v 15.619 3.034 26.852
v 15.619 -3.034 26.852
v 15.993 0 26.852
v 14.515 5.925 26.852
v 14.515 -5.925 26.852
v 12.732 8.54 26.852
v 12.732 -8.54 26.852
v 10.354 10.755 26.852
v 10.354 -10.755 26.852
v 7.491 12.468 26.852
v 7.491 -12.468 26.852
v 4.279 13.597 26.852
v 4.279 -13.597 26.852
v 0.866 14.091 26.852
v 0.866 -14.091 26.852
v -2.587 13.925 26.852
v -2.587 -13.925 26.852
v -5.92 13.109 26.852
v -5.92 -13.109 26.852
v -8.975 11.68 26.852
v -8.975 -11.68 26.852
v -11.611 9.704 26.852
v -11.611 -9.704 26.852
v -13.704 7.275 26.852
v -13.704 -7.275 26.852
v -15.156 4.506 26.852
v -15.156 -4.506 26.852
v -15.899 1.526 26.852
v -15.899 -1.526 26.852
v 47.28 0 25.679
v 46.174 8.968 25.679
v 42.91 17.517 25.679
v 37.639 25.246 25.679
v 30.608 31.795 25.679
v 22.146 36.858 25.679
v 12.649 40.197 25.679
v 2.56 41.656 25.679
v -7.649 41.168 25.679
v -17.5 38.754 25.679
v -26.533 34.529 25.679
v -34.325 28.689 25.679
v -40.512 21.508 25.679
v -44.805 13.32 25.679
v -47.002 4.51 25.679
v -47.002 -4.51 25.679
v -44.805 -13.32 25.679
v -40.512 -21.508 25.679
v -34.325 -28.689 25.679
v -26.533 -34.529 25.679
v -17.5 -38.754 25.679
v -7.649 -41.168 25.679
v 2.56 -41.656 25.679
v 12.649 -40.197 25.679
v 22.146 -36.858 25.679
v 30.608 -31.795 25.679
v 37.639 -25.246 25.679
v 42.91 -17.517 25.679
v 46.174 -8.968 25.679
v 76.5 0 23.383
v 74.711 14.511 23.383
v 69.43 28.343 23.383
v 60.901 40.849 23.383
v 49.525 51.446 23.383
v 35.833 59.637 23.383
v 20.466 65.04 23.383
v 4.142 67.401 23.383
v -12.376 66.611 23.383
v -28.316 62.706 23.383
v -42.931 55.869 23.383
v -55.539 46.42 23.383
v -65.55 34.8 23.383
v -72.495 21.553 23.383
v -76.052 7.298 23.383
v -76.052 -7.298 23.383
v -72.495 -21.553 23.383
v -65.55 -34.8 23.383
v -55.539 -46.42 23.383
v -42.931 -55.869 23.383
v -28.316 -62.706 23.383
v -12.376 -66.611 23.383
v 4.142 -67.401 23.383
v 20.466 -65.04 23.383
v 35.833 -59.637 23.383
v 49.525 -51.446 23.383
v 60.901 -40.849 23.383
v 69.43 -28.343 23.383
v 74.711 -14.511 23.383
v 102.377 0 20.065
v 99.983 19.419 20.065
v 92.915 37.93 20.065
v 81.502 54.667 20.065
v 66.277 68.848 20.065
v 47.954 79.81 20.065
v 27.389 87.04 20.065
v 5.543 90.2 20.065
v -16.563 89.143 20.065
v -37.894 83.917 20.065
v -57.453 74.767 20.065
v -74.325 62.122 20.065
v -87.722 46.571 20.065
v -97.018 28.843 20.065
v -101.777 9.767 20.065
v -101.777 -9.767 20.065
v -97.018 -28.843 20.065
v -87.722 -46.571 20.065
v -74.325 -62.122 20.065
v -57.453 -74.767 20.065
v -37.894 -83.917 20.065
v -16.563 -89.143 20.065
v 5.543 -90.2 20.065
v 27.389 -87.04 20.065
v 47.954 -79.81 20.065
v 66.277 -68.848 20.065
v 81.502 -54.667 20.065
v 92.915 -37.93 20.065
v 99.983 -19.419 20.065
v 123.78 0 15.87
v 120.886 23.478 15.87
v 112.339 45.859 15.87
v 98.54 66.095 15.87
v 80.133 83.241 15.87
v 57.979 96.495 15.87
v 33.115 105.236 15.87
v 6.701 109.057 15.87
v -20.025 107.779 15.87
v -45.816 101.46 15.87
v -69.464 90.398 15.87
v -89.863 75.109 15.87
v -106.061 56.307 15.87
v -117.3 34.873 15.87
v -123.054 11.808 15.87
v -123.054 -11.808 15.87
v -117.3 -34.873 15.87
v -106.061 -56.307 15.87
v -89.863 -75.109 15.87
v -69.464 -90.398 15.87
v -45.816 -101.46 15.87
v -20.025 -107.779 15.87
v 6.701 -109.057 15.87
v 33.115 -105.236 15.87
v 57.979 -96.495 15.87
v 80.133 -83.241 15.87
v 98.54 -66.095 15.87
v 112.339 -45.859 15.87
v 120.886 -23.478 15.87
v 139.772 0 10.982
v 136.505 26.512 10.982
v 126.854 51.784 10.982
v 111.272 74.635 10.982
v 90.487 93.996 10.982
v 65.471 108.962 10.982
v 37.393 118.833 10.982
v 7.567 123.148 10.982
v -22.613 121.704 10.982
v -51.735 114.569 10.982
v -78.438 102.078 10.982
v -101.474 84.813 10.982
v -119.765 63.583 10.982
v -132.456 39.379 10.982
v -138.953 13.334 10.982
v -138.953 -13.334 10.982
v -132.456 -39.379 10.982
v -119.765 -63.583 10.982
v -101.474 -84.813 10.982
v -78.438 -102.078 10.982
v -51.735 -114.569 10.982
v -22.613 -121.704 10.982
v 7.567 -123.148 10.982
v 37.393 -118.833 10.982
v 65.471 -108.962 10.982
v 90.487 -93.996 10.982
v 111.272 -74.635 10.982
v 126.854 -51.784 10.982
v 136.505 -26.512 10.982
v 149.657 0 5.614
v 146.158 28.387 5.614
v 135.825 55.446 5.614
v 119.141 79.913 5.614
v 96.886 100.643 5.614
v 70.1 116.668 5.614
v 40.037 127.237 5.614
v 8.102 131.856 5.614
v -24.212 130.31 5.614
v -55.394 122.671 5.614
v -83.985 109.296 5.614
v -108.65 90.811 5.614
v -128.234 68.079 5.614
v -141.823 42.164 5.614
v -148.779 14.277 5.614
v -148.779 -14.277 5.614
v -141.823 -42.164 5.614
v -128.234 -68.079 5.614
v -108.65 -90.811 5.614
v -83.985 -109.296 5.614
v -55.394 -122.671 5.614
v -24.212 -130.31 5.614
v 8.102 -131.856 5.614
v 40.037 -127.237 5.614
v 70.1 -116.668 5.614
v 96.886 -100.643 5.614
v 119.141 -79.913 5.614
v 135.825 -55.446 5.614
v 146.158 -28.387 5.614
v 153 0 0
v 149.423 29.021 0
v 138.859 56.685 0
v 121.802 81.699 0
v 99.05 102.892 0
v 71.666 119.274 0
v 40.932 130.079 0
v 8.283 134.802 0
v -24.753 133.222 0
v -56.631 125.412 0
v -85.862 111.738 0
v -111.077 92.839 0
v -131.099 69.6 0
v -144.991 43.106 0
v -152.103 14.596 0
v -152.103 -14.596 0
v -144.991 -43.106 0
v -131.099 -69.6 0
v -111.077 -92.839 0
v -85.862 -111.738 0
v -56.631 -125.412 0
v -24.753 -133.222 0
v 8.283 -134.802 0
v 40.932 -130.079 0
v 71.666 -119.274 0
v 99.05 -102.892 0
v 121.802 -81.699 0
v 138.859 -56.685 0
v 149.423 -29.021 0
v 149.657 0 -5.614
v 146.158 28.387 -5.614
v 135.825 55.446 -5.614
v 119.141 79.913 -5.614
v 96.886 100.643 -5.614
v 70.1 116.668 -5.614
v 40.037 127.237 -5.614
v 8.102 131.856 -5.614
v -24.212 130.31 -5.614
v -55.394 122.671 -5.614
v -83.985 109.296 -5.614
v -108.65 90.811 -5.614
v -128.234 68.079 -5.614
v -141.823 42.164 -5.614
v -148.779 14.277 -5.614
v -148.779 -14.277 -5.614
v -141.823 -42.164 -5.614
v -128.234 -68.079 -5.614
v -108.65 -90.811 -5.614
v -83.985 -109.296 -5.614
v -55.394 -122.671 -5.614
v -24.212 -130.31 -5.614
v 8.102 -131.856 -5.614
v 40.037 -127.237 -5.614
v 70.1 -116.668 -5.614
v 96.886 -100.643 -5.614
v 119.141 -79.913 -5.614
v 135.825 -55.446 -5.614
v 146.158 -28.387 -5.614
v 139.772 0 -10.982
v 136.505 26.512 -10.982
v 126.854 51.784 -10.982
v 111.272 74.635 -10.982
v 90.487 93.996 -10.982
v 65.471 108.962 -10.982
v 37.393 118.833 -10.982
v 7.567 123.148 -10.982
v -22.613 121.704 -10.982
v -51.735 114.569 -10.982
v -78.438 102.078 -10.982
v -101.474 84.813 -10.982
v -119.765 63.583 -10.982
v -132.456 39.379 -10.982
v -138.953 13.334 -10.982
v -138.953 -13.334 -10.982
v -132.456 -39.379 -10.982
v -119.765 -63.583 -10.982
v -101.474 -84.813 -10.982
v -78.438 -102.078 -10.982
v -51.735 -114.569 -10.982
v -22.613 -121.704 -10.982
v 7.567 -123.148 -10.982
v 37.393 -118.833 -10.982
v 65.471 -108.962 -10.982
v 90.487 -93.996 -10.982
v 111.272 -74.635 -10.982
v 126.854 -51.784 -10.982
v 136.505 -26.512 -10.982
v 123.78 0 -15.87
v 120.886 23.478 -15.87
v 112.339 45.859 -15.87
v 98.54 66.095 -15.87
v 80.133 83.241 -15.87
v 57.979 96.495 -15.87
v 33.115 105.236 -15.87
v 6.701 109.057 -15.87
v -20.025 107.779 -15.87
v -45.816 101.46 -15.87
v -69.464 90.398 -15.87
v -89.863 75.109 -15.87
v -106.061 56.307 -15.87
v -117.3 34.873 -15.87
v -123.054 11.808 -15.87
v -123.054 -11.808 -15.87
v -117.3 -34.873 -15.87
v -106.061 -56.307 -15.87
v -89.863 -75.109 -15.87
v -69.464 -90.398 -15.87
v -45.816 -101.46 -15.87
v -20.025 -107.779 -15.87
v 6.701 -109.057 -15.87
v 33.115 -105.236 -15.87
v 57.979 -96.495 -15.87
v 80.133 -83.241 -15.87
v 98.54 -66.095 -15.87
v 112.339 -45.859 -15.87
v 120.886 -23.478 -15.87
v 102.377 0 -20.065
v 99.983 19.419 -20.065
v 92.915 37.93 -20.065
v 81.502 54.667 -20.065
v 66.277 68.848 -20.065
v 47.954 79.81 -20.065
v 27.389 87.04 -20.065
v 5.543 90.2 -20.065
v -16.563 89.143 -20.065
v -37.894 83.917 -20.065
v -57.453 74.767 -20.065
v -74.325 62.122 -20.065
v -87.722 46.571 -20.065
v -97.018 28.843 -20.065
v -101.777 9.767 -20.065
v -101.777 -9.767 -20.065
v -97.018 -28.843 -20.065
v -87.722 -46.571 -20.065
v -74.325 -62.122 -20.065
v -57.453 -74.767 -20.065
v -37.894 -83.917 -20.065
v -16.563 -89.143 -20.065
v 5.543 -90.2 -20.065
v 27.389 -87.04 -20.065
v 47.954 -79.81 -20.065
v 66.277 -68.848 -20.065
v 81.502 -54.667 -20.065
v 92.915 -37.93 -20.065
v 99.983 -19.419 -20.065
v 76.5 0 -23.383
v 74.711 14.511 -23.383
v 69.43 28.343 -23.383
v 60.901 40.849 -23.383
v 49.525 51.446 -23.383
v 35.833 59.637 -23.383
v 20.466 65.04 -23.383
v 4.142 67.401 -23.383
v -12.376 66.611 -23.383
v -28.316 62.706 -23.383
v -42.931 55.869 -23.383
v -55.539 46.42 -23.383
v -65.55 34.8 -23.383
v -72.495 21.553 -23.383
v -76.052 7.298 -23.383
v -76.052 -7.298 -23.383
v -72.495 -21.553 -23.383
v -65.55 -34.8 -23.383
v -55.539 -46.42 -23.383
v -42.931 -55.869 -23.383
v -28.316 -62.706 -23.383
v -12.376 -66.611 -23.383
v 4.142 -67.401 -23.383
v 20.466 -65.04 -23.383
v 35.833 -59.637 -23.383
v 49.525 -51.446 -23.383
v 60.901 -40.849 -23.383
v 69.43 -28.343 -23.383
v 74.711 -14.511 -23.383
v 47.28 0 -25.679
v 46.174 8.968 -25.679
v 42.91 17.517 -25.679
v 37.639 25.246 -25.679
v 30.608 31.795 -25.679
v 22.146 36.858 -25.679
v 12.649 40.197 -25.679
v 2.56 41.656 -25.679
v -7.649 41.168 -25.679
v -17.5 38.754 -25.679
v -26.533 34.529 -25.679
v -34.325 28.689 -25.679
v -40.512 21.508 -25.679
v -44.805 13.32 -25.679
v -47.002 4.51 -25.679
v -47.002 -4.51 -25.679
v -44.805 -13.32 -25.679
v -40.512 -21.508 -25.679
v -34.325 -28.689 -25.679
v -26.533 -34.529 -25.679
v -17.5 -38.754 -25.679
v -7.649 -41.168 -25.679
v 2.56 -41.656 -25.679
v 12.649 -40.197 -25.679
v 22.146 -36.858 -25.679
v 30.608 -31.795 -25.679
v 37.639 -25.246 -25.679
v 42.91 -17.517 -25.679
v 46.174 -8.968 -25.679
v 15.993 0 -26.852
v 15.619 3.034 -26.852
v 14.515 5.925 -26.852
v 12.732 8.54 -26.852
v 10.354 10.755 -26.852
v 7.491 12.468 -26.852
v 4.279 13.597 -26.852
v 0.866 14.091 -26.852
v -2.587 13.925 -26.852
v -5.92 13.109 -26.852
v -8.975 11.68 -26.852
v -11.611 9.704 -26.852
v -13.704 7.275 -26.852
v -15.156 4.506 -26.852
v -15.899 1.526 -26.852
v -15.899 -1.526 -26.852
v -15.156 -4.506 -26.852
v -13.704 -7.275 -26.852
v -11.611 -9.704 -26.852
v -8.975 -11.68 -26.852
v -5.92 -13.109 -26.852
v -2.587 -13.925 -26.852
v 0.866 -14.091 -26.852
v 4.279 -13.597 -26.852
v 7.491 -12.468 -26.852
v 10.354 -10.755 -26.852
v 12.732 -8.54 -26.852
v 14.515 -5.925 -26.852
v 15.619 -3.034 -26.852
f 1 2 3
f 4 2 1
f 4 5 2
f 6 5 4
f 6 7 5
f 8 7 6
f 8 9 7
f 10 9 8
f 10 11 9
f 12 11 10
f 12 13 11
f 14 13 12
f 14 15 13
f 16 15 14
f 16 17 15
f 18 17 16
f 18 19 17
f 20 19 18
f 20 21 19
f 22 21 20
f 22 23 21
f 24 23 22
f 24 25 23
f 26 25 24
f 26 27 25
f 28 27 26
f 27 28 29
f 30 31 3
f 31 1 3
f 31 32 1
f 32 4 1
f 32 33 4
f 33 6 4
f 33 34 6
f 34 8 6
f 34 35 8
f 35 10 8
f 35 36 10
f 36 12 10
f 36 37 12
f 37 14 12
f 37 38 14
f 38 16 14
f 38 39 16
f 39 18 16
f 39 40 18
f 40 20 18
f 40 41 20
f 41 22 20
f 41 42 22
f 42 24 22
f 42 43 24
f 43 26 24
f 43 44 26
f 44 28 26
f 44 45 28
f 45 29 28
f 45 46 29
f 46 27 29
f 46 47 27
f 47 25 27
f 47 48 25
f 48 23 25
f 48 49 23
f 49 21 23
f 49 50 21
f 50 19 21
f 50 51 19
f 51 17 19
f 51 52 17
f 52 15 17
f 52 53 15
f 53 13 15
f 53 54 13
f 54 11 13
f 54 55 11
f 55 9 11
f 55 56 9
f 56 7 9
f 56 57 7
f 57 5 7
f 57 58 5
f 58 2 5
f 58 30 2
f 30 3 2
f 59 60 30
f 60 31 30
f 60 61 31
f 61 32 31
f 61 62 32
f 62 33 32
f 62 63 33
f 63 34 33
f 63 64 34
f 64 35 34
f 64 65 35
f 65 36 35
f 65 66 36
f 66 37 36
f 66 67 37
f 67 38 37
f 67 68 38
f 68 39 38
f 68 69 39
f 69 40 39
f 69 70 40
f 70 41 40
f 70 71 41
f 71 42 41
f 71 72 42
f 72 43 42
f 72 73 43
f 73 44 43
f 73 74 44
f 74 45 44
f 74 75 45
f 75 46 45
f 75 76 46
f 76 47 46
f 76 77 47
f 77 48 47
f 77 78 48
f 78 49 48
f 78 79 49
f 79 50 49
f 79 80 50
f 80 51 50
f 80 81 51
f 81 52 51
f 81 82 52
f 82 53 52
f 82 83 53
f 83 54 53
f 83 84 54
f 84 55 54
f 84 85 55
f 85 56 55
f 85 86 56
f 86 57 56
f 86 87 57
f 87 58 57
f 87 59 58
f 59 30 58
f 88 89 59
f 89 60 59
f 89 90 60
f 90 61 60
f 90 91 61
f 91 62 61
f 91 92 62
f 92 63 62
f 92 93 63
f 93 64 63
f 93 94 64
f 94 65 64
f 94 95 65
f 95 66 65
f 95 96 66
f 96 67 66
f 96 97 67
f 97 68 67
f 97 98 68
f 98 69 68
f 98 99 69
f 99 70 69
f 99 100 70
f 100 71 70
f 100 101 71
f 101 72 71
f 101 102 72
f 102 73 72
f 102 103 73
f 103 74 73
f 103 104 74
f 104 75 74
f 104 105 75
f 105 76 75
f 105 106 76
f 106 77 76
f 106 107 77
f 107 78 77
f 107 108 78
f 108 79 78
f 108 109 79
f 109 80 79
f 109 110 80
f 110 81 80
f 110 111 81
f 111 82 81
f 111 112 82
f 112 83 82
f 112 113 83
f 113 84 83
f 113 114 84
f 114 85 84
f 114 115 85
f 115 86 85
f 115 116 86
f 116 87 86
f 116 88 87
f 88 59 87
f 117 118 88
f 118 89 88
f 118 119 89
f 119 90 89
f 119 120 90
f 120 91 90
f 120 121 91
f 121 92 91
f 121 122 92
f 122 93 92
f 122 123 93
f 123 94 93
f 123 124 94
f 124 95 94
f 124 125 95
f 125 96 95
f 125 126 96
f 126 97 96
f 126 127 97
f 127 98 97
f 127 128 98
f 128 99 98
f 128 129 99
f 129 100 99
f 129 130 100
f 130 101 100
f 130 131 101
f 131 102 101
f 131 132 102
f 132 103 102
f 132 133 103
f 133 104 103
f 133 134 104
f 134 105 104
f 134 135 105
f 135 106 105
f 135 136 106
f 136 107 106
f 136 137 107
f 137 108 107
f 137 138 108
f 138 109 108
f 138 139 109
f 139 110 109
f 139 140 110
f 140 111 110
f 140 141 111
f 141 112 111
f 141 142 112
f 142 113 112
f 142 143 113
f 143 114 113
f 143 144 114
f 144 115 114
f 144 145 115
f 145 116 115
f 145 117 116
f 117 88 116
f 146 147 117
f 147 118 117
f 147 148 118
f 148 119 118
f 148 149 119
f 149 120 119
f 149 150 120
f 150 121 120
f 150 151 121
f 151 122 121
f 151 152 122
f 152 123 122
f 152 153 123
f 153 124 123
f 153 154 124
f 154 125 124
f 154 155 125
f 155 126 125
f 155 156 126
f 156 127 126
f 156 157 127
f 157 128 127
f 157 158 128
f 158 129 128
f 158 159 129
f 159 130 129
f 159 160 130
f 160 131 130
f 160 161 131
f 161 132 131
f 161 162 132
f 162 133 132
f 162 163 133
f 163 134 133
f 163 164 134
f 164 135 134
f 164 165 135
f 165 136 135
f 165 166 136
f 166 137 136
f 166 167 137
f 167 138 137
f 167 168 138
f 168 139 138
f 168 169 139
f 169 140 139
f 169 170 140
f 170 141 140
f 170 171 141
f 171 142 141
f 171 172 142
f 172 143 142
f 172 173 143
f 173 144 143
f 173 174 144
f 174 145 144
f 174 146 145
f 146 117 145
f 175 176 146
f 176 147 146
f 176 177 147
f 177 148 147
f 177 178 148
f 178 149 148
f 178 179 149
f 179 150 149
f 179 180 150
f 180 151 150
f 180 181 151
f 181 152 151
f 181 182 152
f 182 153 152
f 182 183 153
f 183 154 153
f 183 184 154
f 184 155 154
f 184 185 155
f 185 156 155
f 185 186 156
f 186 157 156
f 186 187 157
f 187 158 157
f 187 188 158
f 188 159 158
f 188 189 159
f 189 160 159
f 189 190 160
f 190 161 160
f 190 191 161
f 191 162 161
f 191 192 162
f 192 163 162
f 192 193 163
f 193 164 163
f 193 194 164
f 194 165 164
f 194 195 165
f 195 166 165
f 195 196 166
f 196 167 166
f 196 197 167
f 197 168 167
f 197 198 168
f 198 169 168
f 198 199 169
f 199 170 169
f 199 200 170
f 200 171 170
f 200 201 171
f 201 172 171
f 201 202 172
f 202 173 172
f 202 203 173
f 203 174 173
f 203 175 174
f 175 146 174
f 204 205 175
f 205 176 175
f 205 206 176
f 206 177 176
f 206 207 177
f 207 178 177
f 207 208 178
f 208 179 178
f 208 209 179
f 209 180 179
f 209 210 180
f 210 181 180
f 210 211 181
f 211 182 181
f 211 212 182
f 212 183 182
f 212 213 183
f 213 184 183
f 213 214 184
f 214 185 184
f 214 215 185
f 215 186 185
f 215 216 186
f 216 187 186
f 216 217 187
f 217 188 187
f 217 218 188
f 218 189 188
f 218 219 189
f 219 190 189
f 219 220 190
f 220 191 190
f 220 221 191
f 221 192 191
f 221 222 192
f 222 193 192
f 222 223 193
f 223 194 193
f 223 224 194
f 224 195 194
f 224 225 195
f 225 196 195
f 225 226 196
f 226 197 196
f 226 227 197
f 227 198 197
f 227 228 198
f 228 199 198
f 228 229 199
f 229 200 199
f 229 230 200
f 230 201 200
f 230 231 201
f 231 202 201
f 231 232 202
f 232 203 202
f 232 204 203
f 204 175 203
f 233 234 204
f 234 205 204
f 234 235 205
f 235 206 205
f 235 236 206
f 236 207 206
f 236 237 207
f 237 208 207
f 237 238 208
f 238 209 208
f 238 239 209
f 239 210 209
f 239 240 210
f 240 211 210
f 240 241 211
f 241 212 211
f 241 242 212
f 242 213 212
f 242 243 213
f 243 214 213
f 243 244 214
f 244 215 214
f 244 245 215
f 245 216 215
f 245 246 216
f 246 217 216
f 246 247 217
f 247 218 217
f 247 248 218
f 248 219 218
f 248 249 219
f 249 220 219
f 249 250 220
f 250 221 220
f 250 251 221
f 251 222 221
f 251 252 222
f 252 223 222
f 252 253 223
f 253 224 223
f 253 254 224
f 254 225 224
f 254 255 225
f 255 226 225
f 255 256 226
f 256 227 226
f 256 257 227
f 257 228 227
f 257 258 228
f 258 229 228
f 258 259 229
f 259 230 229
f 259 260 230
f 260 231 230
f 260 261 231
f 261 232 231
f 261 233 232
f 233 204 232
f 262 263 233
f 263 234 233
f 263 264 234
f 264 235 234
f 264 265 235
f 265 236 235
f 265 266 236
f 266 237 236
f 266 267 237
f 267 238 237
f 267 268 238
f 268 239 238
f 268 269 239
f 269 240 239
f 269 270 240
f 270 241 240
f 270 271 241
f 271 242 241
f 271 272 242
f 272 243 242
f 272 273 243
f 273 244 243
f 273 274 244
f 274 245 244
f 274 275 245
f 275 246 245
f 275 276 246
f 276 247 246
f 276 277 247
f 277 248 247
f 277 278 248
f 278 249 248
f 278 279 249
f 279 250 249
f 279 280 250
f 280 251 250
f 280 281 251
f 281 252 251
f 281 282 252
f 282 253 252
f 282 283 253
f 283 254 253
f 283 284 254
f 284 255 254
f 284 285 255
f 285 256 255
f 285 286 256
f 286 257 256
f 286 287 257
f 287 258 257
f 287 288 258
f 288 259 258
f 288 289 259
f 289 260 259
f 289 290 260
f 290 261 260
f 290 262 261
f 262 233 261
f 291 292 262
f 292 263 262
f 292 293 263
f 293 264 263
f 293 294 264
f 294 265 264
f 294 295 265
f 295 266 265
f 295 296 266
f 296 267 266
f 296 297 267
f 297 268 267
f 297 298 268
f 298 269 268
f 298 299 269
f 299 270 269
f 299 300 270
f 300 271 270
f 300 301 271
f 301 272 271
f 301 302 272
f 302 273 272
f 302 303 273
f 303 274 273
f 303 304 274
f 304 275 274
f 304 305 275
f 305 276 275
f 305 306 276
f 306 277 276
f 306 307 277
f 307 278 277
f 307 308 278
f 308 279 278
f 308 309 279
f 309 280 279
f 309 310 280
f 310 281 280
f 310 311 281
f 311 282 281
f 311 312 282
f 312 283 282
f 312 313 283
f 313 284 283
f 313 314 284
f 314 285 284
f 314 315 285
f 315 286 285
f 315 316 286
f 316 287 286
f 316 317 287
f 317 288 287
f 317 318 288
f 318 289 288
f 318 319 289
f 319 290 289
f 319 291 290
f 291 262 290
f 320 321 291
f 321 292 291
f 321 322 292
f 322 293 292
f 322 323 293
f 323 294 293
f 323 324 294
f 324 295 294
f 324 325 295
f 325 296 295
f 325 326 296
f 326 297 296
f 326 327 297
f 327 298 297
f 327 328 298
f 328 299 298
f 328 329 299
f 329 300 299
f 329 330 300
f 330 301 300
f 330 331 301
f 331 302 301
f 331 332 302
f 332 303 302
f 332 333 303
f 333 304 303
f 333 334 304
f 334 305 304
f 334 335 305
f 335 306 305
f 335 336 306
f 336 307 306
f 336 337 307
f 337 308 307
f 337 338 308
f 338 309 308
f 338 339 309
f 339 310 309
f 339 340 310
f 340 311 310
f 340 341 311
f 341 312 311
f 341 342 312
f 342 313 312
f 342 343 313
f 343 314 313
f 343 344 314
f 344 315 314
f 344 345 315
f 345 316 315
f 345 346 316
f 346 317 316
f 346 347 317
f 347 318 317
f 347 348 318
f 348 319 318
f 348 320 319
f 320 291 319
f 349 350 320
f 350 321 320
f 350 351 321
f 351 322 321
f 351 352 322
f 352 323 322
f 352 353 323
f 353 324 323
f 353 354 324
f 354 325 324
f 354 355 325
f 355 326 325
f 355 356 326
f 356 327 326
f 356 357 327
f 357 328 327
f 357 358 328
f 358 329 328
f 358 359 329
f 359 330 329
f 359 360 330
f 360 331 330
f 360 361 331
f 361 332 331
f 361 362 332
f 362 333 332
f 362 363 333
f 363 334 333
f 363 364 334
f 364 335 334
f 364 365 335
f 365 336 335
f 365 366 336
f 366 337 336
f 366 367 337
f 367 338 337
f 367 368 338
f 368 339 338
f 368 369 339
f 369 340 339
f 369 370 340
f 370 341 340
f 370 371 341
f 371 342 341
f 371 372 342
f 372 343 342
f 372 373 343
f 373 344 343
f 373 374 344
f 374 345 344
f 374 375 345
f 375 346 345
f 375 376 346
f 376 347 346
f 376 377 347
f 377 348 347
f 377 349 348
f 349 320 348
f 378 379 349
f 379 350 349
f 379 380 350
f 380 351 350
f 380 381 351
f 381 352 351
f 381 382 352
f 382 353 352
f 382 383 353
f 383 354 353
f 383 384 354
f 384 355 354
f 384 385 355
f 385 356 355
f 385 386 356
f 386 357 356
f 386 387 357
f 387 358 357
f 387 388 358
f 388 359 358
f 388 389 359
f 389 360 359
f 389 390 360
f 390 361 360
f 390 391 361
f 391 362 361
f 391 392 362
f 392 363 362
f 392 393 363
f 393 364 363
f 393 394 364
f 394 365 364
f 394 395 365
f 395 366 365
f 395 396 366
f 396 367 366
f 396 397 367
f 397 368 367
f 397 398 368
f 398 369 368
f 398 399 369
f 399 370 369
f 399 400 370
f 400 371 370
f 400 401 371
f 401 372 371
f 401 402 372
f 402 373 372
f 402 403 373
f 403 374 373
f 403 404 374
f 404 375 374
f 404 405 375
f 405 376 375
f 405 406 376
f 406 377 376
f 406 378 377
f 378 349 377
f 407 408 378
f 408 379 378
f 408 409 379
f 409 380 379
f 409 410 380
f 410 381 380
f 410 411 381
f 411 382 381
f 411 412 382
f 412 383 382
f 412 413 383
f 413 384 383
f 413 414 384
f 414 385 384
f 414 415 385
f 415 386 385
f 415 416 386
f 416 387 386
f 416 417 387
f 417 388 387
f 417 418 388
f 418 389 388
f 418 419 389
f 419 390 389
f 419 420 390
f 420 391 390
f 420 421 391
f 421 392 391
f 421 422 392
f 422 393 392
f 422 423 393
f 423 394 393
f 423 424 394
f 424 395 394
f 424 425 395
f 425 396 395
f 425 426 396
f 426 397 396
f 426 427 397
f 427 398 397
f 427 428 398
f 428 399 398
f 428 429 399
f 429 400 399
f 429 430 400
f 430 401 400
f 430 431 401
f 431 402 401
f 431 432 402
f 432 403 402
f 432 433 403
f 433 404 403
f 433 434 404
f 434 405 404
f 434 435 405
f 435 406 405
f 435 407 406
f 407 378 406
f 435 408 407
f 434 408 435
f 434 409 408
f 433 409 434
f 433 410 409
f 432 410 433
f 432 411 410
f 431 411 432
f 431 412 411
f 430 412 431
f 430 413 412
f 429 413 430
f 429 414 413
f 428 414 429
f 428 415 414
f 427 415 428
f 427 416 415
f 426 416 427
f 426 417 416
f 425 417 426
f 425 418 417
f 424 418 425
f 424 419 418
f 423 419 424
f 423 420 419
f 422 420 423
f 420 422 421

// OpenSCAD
// Generated by SolidPython 1.0.1 on 2020-07-29 00:46:53


scale(v = [17, 15, 3]) {
	sphere(r = 9);
}
/***********************************************
*********      SolidPython code:      **********
************************************************
 
# import packages: SolidPython
from solid import *
from solid.utils import *
from itertools import chain, combinations, permutations


class Resize:

    def __init__(self, scad_file):
        self.scad_file = scad_file
        #self.scad_file = import_scad(scad_file)
        # cone/cylinder param:
        self.r1 = 0
        self.r2 = 0
        self.h = 0
        # rectangular prism param:
        self.w = 0
        self.l = 0
        # ellipse param:
        self.r = 0

    # import OpenScad code (file name corresponds to shape)


    # classify shape + parameters
    def assign(self, param1, param2, param3):
        if self.scad_file == 'cone.scad':
            self.r1 = param1
            self.r2 = param2
            self.h = param3
        elif self.scad_file == 'cylinder.scad':
            self.r1 = param1
            self.r2 = param2
            self.h = param3
        elif self.scad_file == 'rectangularPrism.scad':
            self.h = param1
            self.l = param2
            self.w = param3
        else:
            self.r = param1
            self.h = param2

    # resize parameters
    def iterate(self):
        x = range(3, 20, 2)
        i = 1
        if self.scad_file == 'cone.scad':
            tempList = list(permutations(x, 2))
            for temp in tempList:
                param1 = temp[0]
                param2 = temp[1]
                filepath = 'produced_scad_files/' + 'cone' + str(param1) + '_' + str(param2) + '_' + '.scad'
                scad_render_to_file(cylinder(h=param1, r1=param2, r2=0), filepath)

        elif self.scad_file == 'cylinder.scad':
            tempList = list(permutations(x, 3))
            for temp in tempList:
                param1 = temp[0]
                param2 = temp[1]
                filepath = 'produced_scad_files/' + 'cylinder' + str(param1) + '_' + str(param2) + '_' + '.scad'
                scad_render_to_file(cylinder(h=param1, r1=param2, r2=param2), filepath)

        elif self.scad_file == 'rectangularPrism.scad':
            tempList = list(permutations(x, 3))
            for temp in tempList:
                param1 = temp[0]
                param2 = temp[1]
                param3 = temp[2]
                filepath = 'produced_scad_files/' + 'rectangularPrism' + str(param1) + '_' + str(param2) + '_' + str(
                    param3) + '.scad'
                scad_render_to_file(cube(size=(param1, param2, param3)), filepath)

        elif self.scad_file == 'ellipse.scad':
            tempList = list(permutations(x, 4))
            for temp in tempList:
                param1 = temp[0]
                param2 = temp[1]
                param3 = temp[2]
                param4 = temp[3]
                filepath = 'produced_scad_files/' + 'ellipse' + str(param1) + '_' + str(param2) + '_' + str(param3) + '_' + str(param4) + '.scad'
                scad_render_to_file(scale([param1, param2, param3])(sphere(r=param4)), filepath)

    def render_to_scadfile(self):
        scad_render_to_file(scad, 'example.scad') 
 
************************************************/
